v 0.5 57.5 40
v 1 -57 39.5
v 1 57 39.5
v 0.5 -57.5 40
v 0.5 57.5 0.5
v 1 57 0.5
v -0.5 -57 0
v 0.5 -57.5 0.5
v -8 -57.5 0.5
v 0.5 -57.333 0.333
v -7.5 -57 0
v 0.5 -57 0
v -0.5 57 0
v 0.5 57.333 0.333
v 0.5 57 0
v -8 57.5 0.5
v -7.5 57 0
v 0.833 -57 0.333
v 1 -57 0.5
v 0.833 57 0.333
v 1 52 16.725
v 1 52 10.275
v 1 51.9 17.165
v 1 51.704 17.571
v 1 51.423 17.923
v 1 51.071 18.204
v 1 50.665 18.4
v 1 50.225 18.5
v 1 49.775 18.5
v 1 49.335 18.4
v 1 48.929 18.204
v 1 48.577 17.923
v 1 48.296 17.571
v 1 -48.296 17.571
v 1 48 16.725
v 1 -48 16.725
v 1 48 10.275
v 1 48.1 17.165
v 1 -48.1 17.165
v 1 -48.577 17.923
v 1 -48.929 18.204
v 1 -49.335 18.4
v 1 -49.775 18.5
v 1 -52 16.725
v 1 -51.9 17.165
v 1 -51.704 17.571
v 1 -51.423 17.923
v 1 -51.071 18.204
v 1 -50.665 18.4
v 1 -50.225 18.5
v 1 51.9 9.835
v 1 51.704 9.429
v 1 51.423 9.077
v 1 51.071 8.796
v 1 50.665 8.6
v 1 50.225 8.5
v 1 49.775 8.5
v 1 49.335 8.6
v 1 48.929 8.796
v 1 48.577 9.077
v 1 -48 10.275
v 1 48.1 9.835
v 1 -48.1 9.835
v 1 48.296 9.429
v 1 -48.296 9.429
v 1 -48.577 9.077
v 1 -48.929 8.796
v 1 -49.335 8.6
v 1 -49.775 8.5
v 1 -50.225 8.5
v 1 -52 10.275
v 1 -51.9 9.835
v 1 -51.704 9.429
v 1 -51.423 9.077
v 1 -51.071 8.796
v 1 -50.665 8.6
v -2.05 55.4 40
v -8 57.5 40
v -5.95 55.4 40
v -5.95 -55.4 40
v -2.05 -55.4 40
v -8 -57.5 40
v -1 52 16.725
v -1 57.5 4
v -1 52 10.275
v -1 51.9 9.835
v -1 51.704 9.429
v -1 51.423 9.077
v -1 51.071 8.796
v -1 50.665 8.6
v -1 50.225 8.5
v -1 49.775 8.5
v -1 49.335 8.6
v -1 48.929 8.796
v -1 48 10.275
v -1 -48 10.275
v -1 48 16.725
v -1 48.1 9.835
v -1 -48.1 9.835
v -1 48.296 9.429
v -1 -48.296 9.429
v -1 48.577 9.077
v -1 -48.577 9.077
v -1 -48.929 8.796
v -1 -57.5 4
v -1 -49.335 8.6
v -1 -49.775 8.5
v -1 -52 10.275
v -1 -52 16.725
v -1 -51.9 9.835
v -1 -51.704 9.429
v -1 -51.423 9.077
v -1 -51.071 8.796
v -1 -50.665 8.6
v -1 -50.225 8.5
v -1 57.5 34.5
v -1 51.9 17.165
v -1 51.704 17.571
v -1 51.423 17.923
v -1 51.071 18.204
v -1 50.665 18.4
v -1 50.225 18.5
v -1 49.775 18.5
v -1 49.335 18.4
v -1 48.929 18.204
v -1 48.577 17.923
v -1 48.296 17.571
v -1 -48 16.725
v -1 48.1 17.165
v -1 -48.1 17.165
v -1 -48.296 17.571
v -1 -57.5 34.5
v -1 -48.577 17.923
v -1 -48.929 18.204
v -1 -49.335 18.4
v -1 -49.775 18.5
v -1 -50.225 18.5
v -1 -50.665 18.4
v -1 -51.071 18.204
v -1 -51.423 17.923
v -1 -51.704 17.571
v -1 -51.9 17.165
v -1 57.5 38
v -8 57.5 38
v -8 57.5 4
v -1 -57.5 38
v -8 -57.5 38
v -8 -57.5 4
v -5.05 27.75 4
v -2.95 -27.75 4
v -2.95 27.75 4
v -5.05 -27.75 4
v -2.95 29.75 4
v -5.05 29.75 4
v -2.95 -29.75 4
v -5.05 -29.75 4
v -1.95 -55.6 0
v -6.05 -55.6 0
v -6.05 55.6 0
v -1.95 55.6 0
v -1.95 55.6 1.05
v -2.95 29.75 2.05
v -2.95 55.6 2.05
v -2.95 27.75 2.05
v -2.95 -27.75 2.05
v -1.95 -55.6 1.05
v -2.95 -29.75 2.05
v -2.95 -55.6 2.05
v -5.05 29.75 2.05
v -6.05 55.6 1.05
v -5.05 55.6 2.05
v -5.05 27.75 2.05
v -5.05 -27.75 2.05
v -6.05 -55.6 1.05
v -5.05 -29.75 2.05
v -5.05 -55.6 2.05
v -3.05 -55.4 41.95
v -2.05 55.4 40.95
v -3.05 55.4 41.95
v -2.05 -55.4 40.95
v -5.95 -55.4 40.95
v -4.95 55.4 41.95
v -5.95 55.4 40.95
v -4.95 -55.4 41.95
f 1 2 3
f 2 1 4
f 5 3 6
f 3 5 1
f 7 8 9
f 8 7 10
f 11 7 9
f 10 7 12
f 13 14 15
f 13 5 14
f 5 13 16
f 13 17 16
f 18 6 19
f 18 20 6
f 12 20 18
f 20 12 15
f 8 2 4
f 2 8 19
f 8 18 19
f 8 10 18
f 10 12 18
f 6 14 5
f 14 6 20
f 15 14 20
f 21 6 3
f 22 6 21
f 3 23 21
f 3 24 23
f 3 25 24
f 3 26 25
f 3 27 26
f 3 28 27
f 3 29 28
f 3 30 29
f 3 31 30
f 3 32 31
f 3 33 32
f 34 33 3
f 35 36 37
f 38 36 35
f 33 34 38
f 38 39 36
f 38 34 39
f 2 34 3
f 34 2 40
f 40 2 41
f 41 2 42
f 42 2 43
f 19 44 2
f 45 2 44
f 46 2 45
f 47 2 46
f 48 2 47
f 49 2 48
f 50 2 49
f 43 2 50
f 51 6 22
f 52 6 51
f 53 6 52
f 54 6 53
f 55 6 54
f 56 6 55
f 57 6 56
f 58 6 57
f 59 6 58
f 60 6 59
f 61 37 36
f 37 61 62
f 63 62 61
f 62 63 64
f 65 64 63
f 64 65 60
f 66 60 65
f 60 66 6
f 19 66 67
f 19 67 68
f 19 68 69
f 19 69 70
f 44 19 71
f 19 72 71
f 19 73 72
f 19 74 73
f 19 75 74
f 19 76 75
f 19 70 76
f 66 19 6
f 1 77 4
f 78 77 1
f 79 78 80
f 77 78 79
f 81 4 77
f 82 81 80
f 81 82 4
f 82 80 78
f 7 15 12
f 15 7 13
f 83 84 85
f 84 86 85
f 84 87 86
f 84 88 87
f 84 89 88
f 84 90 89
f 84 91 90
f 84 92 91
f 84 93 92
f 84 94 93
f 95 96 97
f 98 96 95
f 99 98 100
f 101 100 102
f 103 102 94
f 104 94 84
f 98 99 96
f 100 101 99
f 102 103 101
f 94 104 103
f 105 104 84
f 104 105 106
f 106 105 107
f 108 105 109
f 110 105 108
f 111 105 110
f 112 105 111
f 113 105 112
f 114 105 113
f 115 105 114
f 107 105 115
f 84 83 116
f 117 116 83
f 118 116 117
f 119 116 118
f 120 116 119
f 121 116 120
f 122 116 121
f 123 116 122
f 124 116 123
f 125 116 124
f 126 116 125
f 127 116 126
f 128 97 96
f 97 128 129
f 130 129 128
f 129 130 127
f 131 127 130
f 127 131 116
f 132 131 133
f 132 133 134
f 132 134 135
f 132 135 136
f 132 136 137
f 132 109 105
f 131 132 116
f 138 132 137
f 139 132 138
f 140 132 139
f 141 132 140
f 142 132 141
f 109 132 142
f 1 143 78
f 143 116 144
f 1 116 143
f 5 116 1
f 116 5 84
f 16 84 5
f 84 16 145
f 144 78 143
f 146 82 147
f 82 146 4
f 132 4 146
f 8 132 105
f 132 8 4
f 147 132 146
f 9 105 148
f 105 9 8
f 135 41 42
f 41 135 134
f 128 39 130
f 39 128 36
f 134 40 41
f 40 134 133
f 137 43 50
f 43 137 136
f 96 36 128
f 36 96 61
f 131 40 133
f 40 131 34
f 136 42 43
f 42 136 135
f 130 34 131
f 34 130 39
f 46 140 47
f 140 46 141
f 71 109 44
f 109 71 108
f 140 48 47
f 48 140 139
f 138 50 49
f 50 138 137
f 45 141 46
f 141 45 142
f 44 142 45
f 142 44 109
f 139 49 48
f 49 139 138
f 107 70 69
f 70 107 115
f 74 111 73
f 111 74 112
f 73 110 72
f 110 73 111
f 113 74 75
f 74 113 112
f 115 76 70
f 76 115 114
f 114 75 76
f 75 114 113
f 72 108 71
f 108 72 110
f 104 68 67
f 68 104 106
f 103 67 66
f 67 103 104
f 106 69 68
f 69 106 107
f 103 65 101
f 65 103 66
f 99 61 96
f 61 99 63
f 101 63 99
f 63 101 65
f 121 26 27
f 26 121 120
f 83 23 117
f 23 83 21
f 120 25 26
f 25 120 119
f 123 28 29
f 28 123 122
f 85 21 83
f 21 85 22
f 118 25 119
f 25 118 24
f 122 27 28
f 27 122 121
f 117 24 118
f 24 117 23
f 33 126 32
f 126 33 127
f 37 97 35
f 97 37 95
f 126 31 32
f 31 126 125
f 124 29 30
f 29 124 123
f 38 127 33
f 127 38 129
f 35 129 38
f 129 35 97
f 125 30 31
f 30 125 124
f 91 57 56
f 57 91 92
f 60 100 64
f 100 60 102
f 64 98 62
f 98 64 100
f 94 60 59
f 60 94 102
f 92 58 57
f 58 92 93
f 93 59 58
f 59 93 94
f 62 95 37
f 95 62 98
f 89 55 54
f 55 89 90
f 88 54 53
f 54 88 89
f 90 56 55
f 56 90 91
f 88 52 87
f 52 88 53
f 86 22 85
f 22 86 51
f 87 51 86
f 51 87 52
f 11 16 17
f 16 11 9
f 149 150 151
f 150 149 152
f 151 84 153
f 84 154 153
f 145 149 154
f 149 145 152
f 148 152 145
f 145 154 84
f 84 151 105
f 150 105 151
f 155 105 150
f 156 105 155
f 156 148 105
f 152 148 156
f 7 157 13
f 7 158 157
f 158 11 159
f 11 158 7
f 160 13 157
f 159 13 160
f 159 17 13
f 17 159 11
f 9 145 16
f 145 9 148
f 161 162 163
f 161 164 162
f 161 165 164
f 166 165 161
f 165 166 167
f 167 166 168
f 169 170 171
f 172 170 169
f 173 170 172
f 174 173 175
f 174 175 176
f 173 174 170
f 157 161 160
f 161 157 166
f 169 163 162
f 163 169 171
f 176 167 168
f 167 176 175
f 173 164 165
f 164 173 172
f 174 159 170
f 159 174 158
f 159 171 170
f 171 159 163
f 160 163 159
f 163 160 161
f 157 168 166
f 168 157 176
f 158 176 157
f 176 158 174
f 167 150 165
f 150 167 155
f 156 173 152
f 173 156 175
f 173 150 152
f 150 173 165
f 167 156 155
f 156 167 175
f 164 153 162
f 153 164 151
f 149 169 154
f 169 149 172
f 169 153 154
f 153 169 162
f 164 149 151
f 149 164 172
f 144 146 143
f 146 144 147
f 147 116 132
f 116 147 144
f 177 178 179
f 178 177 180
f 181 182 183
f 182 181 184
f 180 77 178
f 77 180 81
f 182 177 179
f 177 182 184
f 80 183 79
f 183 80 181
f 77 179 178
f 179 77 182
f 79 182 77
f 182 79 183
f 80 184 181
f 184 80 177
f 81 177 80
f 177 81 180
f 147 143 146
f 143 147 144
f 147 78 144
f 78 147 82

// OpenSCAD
include <BOSL/constants.scad>
use <BOSL/transforms.scad>
use <BOSL/shapes.scad>

thickness = 2;

hard_drive_height = 30;
hard_drive_width = 100;
hard_drive_screw_spacing = 100;
hard_drive_screw_to_bottom_spacing = 6.5;

length = 115; // including thickness, based on printer dimensions
height = hard_drive_height+thickness*5; // 2 thicknesses on bottom and 3 on top

screw_diameter = 4; // 3.5mm plus some slop

slop = 0.1;

$fa = 1;
$fs = .5;

difference() {
    cuboid([thickness, length, height], align=ALIGN_POS, chamfer=thickness/4, edges=EDGES_BOTTOM+EDGES_RIGHT);

    yspread(hard_drive_screw_spacing)
    up(thickness*2+hard_drive_screw_to_bottom_spacing-thickness)
    cuboid([max(thickness+1, screw_diameter), screw_diameter, thickness*5], fillet=screw_diameter/2, align=ALIGN_POS, edges=EDGES_X_ALL);
}

right(-thickness*2)
difference() {
    cuboid([thickness*4, length, thickness*2], align=ALIGN_POS, chamfer=thickness/4, edges=EDGES_BOTTOM);
    cuboid([thickness*2+slop, length-thickness*2+slop*2, thickness*2+slop], chamfer=thickness/2, edges=EDGES_Y_TOP);

    // for resin printers to prevent resin pooling:
    yspread(length/2)
    cuboid([thickness+slop, thickness, thickness*3], align=ALIGN_POS);
}

up(height) {
    left(thickness*2)
    cuboid([thickness*4, length, thickness], align=ALIGN_NEG);

    down(thickness)
    left(thickness*2)
    yrot(180)
    right_triangle([thickness*4, length, thickness*2], align=ALIGN_POS);

    left(thickness*2)
    cuboid([thickness*2-slop, length-thickness*2-slop*2, thickness*2-slop], chamfer=thickness/2, edges=EDGES_Y_TOP);
}
